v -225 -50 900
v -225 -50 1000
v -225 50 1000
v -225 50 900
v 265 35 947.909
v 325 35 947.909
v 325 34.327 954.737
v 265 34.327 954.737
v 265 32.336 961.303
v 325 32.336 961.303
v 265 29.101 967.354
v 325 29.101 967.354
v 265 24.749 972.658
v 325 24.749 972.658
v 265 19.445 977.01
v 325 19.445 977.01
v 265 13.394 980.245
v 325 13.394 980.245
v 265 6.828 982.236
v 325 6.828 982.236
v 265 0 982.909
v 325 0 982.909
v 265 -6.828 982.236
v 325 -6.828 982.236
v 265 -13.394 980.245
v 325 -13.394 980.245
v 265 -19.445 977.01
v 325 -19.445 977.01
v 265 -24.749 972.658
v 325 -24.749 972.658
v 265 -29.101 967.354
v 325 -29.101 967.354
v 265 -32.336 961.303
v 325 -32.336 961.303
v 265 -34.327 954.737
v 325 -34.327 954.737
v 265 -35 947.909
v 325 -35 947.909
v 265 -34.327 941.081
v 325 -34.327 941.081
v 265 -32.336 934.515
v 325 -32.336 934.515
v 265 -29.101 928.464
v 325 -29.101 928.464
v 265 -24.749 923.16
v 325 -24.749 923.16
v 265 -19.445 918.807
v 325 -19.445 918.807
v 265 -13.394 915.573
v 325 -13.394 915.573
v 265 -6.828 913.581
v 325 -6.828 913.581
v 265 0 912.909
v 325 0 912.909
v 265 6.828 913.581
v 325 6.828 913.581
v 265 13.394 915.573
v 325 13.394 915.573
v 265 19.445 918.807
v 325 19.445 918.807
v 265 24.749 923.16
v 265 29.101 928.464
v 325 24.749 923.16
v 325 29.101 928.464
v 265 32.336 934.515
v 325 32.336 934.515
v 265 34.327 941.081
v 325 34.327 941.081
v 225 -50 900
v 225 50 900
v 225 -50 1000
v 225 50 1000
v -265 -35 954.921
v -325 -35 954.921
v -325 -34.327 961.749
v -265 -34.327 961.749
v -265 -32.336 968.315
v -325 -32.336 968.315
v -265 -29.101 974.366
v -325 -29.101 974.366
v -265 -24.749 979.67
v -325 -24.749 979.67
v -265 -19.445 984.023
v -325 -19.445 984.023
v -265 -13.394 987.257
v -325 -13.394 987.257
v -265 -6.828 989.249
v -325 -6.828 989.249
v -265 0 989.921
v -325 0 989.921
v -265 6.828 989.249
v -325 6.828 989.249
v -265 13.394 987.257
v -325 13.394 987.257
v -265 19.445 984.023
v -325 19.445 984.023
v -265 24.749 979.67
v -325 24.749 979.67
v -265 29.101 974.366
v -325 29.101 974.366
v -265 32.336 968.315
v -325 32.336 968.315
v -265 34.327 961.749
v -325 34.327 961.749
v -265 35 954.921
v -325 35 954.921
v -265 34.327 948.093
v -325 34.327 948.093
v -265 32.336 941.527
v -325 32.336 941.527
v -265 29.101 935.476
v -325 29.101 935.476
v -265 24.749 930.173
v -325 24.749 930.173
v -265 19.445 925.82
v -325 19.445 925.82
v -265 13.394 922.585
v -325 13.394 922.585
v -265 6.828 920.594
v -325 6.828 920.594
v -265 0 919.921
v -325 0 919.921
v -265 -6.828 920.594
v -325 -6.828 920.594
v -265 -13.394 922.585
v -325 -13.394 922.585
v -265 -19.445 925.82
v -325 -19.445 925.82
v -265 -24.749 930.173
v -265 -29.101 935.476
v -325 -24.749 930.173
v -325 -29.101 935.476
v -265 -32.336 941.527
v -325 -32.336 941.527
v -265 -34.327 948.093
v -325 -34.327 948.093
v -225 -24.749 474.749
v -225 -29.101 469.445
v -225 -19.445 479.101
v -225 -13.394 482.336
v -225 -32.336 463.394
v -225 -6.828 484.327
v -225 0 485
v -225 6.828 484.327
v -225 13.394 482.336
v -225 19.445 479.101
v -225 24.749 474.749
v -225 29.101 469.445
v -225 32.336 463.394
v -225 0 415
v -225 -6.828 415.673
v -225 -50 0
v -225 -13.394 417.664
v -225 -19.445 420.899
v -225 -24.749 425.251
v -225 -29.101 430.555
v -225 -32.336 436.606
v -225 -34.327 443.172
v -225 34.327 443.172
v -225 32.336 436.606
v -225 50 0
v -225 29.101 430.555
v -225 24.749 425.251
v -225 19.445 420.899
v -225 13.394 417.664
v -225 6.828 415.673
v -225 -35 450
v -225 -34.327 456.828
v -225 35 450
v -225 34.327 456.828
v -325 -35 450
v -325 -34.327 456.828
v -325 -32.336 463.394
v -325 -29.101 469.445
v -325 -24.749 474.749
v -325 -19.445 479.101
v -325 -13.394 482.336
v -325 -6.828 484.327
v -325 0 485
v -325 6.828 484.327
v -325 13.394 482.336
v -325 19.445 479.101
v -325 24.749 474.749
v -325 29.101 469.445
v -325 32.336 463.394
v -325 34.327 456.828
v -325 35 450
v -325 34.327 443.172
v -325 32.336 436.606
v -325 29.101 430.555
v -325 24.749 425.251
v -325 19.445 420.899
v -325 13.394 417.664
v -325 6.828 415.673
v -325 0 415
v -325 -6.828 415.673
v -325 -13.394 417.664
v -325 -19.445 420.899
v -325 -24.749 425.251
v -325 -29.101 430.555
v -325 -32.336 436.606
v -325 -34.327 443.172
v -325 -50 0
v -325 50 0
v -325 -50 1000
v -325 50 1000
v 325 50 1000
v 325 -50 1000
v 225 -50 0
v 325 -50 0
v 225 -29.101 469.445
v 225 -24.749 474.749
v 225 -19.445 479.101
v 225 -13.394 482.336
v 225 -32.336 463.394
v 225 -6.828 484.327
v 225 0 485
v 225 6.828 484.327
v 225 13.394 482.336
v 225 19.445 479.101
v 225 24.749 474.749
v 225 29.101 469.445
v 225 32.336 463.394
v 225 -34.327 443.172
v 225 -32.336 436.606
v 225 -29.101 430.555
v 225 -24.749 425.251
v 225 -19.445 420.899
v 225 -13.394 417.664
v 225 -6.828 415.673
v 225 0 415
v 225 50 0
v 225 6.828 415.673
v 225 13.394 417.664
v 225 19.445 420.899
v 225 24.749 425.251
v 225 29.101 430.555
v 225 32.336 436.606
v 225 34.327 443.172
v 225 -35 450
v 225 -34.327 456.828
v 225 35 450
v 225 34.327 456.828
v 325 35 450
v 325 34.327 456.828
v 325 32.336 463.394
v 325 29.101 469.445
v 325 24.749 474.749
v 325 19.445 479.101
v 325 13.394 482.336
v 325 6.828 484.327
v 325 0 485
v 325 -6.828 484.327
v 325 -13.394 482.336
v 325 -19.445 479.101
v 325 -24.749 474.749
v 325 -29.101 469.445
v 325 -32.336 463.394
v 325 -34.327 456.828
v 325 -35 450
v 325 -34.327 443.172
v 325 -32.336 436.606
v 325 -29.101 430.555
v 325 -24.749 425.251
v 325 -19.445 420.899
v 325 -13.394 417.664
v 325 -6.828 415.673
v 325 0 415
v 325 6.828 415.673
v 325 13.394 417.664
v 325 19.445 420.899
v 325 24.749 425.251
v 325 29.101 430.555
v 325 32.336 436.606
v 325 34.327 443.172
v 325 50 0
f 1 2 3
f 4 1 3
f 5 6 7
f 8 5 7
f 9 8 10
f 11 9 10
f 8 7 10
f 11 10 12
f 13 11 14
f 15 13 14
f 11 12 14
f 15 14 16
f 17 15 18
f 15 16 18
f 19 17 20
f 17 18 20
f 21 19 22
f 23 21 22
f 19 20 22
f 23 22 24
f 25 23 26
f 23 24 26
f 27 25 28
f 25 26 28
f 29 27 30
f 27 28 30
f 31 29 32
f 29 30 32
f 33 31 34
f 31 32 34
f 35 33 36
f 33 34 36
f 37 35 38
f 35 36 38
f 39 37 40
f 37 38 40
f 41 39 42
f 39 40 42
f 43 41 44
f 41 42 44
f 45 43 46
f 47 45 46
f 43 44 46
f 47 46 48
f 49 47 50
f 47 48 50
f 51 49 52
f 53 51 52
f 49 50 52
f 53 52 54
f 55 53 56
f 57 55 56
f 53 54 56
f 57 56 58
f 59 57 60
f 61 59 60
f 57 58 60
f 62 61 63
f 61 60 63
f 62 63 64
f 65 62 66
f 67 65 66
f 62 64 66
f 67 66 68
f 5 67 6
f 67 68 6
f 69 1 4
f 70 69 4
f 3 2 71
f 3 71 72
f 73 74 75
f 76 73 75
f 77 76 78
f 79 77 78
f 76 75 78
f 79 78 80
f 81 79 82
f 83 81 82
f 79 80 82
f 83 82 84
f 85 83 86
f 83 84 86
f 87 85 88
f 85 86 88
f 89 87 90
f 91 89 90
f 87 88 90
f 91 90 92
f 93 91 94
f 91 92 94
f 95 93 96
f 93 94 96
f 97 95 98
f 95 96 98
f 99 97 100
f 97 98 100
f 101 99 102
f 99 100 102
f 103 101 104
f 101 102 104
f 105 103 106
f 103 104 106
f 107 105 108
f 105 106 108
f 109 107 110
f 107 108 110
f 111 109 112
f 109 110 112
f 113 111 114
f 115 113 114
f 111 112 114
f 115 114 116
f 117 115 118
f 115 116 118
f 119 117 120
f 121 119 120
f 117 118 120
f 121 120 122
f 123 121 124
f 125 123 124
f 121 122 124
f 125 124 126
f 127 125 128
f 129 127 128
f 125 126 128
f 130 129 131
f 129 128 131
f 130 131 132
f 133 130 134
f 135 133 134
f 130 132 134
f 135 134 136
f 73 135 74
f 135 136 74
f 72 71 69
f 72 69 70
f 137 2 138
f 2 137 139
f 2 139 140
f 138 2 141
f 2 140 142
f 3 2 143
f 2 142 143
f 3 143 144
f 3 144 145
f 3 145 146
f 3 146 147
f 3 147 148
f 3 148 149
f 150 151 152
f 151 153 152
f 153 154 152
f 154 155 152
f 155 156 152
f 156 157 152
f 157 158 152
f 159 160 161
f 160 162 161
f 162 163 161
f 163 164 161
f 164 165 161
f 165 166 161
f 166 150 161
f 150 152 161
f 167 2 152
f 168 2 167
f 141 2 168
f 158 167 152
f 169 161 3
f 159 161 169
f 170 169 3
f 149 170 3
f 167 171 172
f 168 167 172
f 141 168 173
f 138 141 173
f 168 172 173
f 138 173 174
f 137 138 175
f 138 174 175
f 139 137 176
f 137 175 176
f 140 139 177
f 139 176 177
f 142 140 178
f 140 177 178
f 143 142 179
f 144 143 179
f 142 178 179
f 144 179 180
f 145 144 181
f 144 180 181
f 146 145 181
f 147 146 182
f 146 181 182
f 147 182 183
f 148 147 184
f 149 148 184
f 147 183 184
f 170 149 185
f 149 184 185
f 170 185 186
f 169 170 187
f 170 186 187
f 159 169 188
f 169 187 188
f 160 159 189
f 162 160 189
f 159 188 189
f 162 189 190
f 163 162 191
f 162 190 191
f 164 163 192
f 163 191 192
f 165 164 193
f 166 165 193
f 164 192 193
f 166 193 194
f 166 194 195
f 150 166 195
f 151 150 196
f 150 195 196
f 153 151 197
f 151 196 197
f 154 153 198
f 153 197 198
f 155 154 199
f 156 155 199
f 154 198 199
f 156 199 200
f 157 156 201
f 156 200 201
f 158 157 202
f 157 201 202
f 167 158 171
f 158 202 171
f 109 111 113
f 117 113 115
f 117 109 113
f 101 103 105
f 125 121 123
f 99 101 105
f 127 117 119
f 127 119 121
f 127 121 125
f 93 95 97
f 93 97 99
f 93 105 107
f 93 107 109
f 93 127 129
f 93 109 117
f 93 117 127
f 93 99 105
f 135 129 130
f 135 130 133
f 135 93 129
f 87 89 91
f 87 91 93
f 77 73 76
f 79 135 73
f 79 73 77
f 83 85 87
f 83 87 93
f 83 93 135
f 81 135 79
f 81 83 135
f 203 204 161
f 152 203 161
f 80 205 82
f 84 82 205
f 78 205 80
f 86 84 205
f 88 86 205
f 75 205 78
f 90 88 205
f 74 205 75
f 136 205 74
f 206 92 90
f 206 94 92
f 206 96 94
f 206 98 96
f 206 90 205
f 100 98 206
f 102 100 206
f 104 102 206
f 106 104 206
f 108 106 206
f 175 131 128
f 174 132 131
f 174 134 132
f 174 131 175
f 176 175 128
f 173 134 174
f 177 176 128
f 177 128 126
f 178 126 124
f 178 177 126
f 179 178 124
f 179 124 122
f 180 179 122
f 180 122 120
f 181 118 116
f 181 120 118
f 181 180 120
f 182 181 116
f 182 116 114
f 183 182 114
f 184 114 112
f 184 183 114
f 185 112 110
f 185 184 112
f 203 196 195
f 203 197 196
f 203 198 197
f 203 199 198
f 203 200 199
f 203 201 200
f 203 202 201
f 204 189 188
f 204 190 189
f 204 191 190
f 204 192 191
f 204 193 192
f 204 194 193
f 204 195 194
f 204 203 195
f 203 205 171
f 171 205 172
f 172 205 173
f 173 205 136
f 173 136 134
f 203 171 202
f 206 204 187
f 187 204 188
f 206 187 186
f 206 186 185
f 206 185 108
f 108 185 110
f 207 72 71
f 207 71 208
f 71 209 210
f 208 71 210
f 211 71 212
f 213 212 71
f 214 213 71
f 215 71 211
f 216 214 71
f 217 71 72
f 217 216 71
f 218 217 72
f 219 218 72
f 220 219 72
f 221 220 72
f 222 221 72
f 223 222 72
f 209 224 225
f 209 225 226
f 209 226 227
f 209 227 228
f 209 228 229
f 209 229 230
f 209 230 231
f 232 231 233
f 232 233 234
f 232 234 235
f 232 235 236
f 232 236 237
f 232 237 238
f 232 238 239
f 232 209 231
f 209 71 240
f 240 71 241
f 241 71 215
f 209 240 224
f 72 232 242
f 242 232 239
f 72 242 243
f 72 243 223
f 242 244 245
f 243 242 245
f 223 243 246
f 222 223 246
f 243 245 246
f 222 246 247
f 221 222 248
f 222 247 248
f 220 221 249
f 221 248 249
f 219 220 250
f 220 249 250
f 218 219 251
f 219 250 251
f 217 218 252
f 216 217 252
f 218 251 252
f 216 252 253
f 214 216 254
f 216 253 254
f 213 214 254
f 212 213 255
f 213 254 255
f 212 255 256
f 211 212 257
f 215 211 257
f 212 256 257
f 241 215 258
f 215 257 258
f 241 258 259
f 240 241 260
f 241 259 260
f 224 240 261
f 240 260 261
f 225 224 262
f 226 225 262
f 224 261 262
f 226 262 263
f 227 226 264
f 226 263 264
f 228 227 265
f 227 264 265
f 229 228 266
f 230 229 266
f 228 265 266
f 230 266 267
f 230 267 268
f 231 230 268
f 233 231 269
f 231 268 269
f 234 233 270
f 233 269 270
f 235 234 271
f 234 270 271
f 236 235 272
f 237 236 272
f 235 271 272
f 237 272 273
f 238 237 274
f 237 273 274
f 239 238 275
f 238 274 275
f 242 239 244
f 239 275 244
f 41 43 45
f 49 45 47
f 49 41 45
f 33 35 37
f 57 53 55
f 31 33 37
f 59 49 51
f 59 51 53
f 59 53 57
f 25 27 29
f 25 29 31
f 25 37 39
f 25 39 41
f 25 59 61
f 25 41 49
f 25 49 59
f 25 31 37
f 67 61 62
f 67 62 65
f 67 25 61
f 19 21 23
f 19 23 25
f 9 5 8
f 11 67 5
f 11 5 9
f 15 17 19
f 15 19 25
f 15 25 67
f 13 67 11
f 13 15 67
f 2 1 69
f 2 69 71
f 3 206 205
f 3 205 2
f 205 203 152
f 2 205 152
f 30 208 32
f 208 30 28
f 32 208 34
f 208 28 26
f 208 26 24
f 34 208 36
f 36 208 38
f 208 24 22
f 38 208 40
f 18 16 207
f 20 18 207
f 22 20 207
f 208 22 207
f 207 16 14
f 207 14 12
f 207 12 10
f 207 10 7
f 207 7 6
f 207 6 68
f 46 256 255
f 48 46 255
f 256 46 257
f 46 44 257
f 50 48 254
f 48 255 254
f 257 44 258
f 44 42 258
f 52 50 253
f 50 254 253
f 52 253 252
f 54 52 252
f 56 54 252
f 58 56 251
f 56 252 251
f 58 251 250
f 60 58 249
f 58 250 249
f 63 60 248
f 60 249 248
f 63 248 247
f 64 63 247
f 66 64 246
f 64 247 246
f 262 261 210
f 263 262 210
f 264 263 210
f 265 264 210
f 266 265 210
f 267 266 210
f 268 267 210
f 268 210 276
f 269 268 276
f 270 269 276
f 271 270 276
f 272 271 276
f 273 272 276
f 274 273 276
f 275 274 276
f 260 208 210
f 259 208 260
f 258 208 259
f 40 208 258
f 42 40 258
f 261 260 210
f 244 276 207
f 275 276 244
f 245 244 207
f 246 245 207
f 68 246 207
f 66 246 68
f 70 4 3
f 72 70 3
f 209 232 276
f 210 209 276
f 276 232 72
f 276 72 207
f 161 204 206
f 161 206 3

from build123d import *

# Parameters (mm, degrees)
F0_W      = 100
F0_H      = 100
F1_DEPTH  = 1000
F2_W      = 100
F2_H      = 100
F3_DEPTH  = 450
F4_R      = 35
F5_DEPTH  = 100
F6_R      = 35
F7_DEPTH  = 100
F8_R      = 35
F9_DEPTH  = 60
F10_R     = 35
F11_DEPTH = 60


with BuildPart() as f1:
    # F0 (on Top) → F1 (new body)
    with BuildSketch(Plane.XY):
        with Locations((-275, 0)):
            Rectangle(F0_W, F0_H)
        with Locations((275, 0)):
            Rectangle(F0_W, F0_H)
    extrude(amount=F1_DEPTH)

    # F4 (on face) → F5 (cut, through all)
    with BuildSketch(Plane.YZ.offset(325)):
        with Locations((0, 450)):
            Circle(F4_R)
    extrude(amount=-F5_DEPTH, mode=Mode.SUBTRACT)

    # F6 (on face) → F7 (cut, through all)
    with BuildSketch(Plane(origin=(-325, 0, 0), x_dir=(0, -1, 0), z_dir=(-1, 0, 0))):
        with Locations((0, 450)):
            Circle(F6_R)
    extrude(amount=-F7_DEPTH, mode=Mode.SUBTRACT)

    # F8 (on face) → F9 (cut)
    with BuildSketch(Plane(origin=(-325, 0, 0), x_dir=(0, -1, 0), z_dir=(-1, 0, 0))):
        with Locations((0, 954.921283)):
            Circle(F8_R)
    extrude(amount=-F9_DEPTH, mode=Mode.SUBTRACT)

    # F10 (on face) → F11 (cut)
    with BuildSketch(Plane.YZ.offset(325)):
        with Locations((0, 947.908829)):
            Circle(F10_R)
    extrude(amount=-F11_DEPTH, mode=Mode.SUBTRACT)


with BuildPart() as f3:
    # F2 (on face) → F3 (new body, through all)
    with BuildSketch(Plane.YZ.offset(-225)):
        with Locations((0, 950)):
            Rectangle(F2_W, F2_H)
    extrude(amount=F3_DEPTH)


solid = Compound([f1.part, f3.part])
